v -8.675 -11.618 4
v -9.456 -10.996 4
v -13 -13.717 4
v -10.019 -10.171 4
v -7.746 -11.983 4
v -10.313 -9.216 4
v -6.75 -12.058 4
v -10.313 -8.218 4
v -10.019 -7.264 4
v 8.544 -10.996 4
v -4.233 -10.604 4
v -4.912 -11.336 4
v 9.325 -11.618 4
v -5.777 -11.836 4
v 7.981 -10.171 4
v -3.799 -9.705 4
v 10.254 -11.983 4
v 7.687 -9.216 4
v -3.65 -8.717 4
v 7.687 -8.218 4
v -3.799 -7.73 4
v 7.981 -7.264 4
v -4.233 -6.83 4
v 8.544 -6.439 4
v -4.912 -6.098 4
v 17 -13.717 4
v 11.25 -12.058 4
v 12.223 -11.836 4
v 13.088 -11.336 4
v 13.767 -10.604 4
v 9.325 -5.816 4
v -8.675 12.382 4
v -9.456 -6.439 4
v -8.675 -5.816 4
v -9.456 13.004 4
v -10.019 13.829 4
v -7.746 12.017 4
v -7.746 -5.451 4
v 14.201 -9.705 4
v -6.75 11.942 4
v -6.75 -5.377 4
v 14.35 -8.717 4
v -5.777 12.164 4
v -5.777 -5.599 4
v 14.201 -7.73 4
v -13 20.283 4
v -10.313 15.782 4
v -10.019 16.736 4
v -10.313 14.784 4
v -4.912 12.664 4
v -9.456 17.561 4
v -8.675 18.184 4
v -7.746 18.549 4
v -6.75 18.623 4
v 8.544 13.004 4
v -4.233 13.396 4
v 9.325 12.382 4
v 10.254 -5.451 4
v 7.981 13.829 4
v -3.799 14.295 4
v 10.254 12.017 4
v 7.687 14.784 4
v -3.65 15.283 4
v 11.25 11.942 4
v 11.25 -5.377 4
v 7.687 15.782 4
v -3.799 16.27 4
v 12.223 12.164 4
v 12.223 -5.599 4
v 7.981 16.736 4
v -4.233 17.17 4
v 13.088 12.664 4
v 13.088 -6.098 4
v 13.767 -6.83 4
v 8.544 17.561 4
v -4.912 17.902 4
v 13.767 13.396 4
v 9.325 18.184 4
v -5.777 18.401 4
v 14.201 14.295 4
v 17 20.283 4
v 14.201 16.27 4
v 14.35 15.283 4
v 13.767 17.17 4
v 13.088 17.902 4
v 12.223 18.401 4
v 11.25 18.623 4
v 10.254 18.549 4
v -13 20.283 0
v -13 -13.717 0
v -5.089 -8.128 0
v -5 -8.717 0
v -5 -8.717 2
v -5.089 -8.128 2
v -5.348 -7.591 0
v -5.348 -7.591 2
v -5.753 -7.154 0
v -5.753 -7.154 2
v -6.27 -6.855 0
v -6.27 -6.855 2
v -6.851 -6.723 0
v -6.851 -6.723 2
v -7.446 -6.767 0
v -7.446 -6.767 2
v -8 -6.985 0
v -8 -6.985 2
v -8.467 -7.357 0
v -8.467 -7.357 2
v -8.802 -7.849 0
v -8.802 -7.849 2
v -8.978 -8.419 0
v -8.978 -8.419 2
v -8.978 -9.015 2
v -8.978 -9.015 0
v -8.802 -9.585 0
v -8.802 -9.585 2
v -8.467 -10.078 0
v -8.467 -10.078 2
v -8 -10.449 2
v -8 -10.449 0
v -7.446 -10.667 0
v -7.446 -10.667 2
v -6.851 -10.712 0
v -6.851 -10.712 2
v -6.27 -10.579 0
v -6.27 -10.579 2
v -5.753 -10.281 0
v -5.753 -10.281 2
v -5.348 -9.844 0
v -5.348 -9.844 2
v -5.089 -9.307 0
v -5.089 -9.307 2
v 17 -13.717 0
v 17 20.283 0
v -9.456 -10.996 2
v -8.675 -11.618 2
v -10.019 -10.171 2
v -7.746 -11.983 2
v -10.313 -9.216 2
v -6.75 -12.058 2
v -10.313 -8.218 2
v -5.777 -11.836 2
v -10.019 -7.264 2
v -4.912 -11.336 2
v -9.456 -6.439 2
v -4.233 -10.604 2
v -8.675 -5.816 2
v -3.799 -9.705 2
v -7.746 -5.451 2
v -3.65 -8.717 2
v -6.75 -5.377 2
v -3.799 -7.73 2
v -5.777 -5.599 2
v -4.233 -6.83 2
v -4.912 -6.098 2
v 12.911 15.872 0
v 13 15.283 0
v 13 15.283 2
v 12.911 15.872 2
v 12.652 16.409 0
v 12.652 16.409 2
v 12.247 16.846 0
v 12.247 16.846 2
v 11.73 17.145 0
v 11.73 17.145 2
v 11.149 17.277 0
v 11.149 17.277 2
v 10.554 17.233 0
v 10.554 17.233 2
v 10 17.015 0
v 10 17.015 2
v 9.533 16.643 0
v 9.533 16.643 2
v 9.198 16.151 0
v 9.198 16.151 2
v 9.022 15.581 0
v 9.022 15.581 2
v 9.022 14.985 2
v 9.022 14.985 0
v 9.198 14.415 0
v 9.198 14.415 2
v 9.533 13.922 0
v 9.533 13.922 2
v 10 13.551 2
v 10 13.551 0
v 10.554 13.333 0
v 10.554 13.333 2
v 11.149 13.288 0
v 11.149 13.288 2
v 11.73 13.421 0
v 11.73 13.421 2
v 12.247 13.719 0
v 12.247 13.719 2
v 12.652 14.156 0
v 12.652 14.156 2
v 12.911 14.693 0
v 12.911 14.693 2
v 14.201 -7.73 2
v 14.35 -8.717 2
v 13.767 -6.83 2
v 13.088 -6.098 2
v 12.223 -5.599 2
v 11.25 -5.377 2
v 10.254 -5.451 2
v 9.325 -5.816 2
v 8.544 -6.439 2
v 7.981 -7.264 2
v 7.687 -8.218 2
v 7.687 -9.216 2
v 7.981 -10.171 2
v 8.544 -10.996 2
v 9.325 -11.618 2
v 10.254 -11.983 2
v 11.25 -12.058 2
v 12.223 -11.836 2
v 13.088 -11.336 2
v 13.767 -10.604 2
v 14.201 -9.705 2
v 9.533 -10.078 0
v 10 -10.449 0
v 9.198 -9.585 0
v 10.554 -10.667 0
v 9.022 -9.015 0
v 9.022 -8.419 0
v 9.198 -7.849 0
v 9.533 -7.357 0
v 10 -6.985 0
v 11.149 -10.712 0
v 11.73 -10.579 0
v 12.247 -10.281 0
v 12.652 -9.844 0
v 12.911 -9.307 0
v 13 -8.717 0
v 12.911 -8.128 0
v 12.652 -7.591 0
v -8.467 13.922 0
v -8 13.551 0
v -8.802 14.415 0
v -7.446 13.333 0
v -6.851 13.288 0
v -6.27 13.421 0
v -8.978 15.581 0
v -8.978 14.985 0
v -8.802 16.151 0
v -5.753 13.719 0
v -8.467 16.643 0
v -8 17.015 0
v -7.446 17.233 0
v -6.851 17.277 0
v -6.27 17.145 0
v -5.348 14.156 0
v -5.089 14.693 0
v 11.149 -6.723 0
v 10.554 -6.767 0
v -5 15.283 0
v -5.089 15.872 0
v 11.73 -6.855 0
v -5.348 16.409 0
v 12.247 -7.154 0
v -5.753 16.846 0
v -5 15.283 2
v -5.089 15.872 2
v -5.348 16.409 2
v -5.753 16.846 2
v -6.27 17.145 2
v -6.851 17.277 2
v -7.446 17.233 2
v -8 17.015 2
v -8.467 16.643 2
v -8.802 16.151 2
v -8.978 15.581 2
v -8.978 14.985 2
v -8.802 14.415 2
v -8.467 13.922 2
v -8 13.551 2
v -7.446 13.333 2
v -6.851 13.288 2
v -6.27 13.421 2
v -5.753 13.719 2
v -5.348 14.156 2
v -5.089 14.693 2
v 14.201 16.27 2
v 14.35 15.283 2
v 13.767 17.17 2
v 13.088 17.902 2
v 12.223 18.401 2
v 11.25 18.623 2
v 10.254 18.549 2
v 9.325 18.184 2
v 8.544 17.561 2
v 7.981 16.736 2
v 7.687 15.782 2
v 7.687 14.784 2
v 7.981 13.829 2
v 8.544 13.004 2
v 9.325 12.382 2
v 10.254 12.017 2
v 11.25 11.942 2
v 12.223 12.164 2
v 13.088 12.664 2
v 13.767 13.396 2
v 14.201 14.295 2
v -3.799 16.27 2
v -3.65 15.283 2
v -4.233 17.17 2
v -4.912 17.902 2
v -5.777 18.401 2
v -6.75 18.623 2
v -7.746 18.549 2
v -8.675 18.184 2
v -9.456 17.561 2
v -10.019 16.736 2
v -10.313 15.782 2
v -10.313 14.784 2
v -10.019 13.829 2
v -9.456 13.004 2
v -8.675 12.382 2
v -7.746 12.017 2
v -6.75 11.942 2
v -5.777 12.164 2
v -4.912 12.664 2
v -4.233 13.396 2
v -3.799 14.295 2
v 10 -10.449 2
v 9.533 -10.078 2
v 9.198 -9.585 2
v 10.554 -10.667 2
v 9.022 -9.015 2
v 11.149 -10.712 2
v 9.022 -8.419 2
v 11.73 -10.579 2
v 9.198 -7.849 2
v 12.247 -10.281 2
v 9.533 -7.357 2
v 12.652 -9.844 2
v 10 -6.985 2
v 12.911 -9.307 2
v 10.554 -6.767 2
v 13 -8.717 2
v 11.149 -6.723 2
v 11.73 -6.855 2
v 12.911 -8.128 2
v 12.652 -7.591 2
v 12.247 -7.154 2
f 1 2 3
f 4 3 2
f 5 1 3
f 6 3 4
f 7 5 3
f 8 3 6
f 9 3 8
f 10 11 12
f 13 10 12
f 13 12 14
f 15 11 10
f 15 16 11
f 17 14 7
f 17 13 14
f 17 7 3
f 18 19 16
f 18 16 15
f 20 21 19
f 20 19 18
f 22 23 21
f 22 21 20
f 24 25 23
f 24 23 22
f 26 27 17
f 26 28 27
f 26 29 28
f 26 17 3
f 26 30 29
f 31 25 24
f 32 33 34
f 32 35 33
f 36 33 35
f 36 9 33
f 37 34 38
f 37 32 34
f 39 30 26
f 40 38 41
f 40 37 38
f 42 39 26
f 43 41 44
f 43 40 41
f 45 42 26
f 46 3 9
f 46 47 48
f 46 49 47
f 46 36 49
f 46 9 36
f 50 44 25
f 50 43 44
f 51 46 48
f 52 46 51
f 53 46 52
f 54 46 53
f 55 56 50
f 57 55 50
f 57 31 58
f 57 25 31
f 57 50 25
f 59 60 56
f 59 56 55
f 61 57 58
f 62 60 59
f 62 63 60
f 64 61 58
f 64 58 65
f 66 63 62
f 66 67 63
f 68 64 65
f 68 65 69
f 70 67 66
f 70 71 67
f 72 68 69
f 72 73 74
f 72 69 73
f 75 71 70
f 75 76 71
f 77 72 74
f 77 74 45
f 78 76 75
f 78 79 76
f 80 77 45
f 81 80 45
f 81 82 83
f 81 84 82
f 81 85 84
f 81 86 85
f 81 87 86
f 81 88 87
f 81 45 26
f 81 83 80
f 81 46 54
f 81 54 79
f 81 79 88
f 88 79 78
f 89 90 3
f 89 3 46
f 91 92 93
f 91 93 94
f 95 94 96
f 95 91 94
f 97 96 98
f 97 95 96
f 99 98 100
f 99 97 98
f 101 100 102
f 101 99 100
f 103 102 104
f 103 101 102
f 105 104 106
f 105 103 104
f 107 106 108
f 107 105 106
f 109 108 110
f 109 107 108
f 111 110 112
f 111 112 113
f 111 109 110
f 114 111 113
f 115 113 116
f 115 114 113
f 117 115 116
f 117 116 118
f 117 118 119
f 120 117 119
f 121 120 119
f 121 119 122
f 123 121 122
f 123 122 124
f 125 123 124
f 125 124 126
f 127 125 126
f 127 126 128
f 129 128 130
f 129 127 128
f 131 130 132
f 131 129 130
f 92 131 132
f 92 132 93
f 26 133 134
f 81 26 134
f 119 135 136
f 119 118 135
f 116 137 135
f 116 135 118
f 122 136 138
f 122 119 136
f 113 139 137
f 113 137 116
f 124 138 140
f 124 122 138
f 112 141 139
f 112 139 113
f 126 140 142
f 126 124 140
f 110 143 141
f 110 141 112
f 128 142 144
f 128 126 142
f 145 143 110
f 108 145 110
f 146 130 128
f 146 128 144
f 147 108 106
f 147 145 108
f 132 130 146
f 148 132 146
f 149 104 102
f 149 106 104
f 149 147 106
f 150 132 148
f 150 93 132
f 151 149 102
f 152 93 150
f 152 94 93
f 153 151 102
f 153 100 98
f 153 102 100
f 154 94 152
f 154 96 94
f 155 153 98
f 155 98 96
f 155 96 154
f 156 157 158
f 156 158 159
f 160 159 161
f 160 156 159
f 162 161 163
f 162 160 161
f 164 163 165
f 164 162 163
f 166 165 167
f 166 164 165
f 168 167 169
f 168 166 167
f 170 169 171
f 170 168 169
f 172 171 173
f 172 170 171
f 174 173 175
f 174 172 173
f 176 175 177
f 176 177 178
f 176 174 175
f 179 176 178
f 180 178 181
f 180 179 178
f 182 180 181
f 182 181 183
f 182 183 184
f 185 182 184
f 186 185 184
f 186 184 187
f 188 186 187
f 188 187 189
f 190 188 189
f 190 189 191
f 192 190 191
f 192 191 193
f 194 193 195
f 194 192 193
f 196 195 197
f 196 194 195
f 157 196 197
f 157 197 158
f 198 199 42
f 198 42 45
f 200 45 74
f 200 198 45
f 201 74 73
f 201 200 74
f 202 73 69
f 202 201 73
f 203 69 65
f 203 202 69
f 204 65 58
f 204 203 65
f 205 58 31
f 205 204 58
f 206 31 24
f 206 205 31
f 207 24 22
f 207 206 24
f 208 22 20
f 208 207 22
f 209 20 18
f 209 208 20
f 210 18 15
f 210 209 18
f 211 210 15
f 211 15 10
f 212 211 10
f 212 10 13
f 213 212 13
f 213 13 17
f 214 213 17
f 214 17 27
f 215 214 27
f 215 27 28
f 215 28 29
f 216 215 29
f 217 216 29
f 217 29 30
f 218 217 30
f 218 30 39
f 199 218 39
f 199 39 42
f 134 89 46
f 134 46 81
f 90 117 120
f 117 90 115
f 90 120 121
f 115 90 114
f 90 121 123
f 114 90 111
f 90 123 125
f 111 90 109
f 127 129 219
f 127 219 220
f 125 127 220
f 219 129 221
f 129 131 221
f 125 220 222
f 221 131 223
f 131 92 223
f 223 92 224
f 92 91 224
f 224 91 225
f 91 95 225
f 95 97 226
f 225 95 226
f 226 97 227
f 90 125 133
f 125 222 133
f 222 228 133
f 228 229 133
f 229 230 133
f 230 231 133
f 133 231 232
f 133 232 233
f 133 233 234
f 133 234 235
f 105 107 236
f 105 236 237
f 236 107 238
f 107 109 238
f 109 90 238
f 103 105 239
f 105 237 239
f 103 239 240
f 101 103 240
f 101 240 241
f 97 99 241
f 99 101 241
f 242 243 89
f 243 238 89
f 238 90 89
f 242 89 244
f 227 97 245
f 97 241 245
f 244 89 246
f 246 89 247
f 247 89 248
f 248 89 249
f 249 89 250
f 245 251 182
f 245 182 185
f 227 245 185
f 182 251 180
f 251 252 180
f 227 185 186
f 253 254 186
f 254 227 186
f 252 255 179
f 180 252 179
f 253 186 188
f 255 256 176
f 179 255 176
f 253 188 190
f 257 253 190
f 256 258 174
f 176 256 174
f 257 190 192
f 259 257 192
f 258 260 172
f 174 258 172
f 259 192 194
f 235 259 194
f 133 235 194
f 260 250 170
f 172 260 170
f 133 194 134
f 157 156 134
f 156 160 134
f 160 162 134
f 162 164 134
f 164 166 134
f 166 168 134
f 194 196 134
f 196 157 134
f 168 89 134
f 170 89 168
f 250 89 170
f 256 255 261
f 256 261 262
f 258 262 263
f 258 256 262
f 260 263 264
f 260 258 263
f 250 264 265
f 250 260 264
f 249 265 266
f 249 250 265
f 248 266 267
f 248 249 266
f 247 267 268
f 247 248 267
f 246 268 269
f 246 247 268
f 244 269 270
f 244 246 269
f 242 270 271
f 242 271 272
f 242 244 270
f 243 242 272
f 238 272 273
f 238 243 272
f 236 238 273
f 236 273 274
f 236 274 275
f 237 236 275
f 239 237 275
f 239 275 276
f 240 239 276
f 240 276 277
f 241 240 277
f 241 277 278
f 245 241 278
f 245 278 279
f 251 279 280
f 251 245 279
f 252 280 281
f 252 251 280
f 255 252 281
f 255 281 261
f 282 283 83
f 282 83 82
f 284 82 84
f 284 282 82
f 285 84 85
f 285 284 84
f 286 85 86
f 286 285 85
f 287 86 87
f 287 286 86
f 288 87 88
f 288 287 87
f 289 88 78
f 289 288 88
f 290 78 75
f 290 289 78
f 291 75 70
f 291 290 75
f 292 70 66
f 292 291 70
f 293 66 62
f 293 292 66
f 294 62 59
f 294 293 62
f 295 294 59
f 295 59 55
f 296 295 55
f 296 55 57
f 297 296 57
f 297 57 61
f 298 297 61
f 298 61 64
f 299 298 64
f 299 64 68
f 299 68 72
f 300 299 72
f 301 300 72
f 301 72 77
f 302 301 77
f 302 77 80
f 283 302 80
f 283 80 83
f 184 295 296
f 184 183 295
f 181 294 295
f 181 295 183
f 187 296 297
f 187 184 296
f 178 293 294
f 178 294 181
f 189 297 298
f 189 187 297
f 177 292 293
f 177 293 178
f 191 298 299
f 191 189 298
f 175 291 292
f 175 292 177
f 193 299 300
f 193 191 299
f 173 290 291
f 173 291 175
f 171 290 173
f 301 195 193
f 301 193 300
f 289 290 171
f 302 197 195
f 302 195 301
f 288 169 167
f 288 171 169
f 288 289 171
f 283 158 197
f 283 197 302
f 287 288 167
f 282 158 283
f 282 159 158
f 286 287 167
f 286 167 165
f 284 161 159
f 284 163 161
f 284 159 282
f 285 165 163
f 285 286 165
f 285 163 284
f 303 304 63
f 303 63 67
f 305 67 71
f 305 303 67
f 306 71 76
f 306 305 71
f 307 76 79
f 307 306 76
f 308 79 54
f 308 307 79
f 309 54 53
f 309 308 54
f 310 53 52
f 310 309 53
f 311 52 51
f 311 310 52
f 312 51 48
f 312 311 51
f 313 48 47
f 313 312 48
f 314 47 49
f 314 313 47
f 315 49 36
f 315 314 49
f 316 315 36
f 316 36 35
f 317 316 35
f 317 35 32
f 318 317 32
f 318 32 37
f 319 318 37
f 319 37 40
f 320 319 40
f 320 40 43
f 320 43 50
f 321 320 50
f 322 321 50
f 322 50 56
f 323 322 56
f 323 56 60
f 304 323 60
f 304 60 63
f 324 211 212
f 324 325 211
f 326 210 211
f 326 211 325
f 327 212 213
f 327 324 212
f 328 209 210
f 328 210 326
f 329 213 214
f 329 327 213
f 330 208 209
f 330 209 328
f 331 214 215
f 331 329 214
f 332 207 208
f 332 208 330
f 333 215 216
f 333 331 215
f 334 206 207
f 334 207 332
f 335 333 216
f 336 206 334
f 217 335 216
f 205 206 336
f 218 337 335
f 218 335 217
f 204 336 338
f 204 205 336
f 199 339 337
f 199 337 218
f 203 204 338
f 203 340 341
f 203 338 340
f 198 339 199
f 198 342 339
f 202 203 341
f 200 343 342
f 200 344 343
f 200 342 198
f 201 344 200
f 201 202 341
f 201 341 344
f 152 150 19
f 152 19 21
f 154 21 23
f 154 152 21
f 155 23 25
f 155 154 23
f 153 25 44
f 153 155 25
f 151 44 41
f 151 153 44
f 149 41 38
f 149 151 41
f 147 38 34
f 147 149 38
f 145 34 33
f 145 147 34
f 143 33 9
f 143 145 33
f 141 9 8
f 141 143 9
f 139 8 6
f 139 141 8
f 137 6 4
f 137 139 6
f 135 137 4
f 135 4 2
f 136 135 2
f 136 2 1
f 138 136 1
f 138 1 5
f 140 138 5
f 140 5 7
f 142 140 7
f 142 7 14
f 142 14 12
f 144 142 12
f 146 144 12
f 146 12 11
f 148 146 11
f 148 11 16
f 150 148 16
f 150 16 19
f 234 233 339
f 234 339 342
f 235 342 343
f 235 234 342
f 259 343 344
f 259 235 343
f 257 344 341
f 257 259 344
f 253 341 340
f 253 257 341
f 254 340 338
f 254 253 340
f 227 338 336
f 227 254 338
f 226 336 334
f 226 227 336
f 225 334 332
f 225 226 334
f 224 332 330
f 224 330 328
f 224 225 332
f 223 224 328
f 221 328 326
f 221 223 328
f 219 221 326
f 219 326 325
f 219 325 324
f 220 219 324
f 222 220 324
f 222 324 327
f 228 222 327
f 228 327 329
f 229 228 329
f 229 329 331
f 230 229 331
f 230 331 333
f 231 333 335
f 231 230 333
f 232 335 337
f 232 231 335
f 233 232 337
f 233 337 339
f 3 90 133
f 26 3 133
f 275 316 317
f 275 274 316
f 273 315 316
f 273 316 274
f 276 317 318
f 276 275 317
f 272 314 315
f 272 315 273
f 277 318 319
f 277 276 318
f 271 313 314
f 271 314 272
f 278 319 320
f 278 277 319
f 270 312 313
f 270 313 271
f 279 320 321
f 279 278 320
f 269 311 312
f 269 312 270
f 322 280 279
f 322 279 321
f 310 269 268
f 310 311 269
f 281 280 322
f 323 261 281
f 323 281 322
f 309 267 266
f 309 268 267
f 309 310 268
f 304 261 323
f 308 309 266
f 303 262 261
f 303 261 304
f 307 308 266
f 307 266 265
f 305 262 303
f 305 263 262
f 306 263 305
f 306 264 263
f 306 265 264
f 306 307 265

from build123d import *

# Parameters (mm, degrees)
F0_W     = 30
F0_H     = 34
F0_R     = 3.35
F1_DEPTH = 4
F0_R_2   = 2
F2_DEPTH = 2


with BuildPart() as f1:
    # F0 (on Top) → F1 (new body)
    with BuildSketch(Plane.XY):
        with Locations((1.999535, 3.282795)):
            Rectangle(F0_W, F0_H)
        with Locations((-7.000465, -8.717205)):
            Circle(F0_R, mode=Mode.SUBTRACT)
        with Locations((10.999535, -8.717205)):
            Circle(F0_R, mode=Mode.SUBTRACT)
        with Locations((-7.000465, 15.282795)):
            Circle(F0_R, mode=Mode.SUBTRACT)
        with Locations((10.999535, 15.282795)):
            Circle(F0_R, mode=Mode.SUBTRACT)
    extrude(amount=F1_DEPTH)

    # F0 (on Top) → F2 (join)
    with BuildSketch(Plane.XY):
        with Locations((-7.000465, 15.282795)):
            Circle(F0_R)
        with Locations((-7.000465, 15.282795)):
            Circle(F0_R_2, mode=Mode.SUBTRACT)
        with Locations((10.999535, 15.282795)):
            Circle(F0_R)
        with Locations((10.999535, 15.282795)):
            Circle(F0_R_2, mode=Mode.SUBTRACT)
        with Locations((10.999535, -8.717205)):
            Circle(F0_R)
        with Locations((10.999535, -8.717205)):
            Circle(F0_R_2, mode=Mode.SUBTRACT)
        with Locations((-7.000465, -8.717205)):
            Circle(F0_R)
        with Locations((-7.000465, -8.717205)):
            Circle(F0_R_2, mode=Mode.SUBTRACT)
    extrude(amount=F2_DEPTH)


solid = f1.part
